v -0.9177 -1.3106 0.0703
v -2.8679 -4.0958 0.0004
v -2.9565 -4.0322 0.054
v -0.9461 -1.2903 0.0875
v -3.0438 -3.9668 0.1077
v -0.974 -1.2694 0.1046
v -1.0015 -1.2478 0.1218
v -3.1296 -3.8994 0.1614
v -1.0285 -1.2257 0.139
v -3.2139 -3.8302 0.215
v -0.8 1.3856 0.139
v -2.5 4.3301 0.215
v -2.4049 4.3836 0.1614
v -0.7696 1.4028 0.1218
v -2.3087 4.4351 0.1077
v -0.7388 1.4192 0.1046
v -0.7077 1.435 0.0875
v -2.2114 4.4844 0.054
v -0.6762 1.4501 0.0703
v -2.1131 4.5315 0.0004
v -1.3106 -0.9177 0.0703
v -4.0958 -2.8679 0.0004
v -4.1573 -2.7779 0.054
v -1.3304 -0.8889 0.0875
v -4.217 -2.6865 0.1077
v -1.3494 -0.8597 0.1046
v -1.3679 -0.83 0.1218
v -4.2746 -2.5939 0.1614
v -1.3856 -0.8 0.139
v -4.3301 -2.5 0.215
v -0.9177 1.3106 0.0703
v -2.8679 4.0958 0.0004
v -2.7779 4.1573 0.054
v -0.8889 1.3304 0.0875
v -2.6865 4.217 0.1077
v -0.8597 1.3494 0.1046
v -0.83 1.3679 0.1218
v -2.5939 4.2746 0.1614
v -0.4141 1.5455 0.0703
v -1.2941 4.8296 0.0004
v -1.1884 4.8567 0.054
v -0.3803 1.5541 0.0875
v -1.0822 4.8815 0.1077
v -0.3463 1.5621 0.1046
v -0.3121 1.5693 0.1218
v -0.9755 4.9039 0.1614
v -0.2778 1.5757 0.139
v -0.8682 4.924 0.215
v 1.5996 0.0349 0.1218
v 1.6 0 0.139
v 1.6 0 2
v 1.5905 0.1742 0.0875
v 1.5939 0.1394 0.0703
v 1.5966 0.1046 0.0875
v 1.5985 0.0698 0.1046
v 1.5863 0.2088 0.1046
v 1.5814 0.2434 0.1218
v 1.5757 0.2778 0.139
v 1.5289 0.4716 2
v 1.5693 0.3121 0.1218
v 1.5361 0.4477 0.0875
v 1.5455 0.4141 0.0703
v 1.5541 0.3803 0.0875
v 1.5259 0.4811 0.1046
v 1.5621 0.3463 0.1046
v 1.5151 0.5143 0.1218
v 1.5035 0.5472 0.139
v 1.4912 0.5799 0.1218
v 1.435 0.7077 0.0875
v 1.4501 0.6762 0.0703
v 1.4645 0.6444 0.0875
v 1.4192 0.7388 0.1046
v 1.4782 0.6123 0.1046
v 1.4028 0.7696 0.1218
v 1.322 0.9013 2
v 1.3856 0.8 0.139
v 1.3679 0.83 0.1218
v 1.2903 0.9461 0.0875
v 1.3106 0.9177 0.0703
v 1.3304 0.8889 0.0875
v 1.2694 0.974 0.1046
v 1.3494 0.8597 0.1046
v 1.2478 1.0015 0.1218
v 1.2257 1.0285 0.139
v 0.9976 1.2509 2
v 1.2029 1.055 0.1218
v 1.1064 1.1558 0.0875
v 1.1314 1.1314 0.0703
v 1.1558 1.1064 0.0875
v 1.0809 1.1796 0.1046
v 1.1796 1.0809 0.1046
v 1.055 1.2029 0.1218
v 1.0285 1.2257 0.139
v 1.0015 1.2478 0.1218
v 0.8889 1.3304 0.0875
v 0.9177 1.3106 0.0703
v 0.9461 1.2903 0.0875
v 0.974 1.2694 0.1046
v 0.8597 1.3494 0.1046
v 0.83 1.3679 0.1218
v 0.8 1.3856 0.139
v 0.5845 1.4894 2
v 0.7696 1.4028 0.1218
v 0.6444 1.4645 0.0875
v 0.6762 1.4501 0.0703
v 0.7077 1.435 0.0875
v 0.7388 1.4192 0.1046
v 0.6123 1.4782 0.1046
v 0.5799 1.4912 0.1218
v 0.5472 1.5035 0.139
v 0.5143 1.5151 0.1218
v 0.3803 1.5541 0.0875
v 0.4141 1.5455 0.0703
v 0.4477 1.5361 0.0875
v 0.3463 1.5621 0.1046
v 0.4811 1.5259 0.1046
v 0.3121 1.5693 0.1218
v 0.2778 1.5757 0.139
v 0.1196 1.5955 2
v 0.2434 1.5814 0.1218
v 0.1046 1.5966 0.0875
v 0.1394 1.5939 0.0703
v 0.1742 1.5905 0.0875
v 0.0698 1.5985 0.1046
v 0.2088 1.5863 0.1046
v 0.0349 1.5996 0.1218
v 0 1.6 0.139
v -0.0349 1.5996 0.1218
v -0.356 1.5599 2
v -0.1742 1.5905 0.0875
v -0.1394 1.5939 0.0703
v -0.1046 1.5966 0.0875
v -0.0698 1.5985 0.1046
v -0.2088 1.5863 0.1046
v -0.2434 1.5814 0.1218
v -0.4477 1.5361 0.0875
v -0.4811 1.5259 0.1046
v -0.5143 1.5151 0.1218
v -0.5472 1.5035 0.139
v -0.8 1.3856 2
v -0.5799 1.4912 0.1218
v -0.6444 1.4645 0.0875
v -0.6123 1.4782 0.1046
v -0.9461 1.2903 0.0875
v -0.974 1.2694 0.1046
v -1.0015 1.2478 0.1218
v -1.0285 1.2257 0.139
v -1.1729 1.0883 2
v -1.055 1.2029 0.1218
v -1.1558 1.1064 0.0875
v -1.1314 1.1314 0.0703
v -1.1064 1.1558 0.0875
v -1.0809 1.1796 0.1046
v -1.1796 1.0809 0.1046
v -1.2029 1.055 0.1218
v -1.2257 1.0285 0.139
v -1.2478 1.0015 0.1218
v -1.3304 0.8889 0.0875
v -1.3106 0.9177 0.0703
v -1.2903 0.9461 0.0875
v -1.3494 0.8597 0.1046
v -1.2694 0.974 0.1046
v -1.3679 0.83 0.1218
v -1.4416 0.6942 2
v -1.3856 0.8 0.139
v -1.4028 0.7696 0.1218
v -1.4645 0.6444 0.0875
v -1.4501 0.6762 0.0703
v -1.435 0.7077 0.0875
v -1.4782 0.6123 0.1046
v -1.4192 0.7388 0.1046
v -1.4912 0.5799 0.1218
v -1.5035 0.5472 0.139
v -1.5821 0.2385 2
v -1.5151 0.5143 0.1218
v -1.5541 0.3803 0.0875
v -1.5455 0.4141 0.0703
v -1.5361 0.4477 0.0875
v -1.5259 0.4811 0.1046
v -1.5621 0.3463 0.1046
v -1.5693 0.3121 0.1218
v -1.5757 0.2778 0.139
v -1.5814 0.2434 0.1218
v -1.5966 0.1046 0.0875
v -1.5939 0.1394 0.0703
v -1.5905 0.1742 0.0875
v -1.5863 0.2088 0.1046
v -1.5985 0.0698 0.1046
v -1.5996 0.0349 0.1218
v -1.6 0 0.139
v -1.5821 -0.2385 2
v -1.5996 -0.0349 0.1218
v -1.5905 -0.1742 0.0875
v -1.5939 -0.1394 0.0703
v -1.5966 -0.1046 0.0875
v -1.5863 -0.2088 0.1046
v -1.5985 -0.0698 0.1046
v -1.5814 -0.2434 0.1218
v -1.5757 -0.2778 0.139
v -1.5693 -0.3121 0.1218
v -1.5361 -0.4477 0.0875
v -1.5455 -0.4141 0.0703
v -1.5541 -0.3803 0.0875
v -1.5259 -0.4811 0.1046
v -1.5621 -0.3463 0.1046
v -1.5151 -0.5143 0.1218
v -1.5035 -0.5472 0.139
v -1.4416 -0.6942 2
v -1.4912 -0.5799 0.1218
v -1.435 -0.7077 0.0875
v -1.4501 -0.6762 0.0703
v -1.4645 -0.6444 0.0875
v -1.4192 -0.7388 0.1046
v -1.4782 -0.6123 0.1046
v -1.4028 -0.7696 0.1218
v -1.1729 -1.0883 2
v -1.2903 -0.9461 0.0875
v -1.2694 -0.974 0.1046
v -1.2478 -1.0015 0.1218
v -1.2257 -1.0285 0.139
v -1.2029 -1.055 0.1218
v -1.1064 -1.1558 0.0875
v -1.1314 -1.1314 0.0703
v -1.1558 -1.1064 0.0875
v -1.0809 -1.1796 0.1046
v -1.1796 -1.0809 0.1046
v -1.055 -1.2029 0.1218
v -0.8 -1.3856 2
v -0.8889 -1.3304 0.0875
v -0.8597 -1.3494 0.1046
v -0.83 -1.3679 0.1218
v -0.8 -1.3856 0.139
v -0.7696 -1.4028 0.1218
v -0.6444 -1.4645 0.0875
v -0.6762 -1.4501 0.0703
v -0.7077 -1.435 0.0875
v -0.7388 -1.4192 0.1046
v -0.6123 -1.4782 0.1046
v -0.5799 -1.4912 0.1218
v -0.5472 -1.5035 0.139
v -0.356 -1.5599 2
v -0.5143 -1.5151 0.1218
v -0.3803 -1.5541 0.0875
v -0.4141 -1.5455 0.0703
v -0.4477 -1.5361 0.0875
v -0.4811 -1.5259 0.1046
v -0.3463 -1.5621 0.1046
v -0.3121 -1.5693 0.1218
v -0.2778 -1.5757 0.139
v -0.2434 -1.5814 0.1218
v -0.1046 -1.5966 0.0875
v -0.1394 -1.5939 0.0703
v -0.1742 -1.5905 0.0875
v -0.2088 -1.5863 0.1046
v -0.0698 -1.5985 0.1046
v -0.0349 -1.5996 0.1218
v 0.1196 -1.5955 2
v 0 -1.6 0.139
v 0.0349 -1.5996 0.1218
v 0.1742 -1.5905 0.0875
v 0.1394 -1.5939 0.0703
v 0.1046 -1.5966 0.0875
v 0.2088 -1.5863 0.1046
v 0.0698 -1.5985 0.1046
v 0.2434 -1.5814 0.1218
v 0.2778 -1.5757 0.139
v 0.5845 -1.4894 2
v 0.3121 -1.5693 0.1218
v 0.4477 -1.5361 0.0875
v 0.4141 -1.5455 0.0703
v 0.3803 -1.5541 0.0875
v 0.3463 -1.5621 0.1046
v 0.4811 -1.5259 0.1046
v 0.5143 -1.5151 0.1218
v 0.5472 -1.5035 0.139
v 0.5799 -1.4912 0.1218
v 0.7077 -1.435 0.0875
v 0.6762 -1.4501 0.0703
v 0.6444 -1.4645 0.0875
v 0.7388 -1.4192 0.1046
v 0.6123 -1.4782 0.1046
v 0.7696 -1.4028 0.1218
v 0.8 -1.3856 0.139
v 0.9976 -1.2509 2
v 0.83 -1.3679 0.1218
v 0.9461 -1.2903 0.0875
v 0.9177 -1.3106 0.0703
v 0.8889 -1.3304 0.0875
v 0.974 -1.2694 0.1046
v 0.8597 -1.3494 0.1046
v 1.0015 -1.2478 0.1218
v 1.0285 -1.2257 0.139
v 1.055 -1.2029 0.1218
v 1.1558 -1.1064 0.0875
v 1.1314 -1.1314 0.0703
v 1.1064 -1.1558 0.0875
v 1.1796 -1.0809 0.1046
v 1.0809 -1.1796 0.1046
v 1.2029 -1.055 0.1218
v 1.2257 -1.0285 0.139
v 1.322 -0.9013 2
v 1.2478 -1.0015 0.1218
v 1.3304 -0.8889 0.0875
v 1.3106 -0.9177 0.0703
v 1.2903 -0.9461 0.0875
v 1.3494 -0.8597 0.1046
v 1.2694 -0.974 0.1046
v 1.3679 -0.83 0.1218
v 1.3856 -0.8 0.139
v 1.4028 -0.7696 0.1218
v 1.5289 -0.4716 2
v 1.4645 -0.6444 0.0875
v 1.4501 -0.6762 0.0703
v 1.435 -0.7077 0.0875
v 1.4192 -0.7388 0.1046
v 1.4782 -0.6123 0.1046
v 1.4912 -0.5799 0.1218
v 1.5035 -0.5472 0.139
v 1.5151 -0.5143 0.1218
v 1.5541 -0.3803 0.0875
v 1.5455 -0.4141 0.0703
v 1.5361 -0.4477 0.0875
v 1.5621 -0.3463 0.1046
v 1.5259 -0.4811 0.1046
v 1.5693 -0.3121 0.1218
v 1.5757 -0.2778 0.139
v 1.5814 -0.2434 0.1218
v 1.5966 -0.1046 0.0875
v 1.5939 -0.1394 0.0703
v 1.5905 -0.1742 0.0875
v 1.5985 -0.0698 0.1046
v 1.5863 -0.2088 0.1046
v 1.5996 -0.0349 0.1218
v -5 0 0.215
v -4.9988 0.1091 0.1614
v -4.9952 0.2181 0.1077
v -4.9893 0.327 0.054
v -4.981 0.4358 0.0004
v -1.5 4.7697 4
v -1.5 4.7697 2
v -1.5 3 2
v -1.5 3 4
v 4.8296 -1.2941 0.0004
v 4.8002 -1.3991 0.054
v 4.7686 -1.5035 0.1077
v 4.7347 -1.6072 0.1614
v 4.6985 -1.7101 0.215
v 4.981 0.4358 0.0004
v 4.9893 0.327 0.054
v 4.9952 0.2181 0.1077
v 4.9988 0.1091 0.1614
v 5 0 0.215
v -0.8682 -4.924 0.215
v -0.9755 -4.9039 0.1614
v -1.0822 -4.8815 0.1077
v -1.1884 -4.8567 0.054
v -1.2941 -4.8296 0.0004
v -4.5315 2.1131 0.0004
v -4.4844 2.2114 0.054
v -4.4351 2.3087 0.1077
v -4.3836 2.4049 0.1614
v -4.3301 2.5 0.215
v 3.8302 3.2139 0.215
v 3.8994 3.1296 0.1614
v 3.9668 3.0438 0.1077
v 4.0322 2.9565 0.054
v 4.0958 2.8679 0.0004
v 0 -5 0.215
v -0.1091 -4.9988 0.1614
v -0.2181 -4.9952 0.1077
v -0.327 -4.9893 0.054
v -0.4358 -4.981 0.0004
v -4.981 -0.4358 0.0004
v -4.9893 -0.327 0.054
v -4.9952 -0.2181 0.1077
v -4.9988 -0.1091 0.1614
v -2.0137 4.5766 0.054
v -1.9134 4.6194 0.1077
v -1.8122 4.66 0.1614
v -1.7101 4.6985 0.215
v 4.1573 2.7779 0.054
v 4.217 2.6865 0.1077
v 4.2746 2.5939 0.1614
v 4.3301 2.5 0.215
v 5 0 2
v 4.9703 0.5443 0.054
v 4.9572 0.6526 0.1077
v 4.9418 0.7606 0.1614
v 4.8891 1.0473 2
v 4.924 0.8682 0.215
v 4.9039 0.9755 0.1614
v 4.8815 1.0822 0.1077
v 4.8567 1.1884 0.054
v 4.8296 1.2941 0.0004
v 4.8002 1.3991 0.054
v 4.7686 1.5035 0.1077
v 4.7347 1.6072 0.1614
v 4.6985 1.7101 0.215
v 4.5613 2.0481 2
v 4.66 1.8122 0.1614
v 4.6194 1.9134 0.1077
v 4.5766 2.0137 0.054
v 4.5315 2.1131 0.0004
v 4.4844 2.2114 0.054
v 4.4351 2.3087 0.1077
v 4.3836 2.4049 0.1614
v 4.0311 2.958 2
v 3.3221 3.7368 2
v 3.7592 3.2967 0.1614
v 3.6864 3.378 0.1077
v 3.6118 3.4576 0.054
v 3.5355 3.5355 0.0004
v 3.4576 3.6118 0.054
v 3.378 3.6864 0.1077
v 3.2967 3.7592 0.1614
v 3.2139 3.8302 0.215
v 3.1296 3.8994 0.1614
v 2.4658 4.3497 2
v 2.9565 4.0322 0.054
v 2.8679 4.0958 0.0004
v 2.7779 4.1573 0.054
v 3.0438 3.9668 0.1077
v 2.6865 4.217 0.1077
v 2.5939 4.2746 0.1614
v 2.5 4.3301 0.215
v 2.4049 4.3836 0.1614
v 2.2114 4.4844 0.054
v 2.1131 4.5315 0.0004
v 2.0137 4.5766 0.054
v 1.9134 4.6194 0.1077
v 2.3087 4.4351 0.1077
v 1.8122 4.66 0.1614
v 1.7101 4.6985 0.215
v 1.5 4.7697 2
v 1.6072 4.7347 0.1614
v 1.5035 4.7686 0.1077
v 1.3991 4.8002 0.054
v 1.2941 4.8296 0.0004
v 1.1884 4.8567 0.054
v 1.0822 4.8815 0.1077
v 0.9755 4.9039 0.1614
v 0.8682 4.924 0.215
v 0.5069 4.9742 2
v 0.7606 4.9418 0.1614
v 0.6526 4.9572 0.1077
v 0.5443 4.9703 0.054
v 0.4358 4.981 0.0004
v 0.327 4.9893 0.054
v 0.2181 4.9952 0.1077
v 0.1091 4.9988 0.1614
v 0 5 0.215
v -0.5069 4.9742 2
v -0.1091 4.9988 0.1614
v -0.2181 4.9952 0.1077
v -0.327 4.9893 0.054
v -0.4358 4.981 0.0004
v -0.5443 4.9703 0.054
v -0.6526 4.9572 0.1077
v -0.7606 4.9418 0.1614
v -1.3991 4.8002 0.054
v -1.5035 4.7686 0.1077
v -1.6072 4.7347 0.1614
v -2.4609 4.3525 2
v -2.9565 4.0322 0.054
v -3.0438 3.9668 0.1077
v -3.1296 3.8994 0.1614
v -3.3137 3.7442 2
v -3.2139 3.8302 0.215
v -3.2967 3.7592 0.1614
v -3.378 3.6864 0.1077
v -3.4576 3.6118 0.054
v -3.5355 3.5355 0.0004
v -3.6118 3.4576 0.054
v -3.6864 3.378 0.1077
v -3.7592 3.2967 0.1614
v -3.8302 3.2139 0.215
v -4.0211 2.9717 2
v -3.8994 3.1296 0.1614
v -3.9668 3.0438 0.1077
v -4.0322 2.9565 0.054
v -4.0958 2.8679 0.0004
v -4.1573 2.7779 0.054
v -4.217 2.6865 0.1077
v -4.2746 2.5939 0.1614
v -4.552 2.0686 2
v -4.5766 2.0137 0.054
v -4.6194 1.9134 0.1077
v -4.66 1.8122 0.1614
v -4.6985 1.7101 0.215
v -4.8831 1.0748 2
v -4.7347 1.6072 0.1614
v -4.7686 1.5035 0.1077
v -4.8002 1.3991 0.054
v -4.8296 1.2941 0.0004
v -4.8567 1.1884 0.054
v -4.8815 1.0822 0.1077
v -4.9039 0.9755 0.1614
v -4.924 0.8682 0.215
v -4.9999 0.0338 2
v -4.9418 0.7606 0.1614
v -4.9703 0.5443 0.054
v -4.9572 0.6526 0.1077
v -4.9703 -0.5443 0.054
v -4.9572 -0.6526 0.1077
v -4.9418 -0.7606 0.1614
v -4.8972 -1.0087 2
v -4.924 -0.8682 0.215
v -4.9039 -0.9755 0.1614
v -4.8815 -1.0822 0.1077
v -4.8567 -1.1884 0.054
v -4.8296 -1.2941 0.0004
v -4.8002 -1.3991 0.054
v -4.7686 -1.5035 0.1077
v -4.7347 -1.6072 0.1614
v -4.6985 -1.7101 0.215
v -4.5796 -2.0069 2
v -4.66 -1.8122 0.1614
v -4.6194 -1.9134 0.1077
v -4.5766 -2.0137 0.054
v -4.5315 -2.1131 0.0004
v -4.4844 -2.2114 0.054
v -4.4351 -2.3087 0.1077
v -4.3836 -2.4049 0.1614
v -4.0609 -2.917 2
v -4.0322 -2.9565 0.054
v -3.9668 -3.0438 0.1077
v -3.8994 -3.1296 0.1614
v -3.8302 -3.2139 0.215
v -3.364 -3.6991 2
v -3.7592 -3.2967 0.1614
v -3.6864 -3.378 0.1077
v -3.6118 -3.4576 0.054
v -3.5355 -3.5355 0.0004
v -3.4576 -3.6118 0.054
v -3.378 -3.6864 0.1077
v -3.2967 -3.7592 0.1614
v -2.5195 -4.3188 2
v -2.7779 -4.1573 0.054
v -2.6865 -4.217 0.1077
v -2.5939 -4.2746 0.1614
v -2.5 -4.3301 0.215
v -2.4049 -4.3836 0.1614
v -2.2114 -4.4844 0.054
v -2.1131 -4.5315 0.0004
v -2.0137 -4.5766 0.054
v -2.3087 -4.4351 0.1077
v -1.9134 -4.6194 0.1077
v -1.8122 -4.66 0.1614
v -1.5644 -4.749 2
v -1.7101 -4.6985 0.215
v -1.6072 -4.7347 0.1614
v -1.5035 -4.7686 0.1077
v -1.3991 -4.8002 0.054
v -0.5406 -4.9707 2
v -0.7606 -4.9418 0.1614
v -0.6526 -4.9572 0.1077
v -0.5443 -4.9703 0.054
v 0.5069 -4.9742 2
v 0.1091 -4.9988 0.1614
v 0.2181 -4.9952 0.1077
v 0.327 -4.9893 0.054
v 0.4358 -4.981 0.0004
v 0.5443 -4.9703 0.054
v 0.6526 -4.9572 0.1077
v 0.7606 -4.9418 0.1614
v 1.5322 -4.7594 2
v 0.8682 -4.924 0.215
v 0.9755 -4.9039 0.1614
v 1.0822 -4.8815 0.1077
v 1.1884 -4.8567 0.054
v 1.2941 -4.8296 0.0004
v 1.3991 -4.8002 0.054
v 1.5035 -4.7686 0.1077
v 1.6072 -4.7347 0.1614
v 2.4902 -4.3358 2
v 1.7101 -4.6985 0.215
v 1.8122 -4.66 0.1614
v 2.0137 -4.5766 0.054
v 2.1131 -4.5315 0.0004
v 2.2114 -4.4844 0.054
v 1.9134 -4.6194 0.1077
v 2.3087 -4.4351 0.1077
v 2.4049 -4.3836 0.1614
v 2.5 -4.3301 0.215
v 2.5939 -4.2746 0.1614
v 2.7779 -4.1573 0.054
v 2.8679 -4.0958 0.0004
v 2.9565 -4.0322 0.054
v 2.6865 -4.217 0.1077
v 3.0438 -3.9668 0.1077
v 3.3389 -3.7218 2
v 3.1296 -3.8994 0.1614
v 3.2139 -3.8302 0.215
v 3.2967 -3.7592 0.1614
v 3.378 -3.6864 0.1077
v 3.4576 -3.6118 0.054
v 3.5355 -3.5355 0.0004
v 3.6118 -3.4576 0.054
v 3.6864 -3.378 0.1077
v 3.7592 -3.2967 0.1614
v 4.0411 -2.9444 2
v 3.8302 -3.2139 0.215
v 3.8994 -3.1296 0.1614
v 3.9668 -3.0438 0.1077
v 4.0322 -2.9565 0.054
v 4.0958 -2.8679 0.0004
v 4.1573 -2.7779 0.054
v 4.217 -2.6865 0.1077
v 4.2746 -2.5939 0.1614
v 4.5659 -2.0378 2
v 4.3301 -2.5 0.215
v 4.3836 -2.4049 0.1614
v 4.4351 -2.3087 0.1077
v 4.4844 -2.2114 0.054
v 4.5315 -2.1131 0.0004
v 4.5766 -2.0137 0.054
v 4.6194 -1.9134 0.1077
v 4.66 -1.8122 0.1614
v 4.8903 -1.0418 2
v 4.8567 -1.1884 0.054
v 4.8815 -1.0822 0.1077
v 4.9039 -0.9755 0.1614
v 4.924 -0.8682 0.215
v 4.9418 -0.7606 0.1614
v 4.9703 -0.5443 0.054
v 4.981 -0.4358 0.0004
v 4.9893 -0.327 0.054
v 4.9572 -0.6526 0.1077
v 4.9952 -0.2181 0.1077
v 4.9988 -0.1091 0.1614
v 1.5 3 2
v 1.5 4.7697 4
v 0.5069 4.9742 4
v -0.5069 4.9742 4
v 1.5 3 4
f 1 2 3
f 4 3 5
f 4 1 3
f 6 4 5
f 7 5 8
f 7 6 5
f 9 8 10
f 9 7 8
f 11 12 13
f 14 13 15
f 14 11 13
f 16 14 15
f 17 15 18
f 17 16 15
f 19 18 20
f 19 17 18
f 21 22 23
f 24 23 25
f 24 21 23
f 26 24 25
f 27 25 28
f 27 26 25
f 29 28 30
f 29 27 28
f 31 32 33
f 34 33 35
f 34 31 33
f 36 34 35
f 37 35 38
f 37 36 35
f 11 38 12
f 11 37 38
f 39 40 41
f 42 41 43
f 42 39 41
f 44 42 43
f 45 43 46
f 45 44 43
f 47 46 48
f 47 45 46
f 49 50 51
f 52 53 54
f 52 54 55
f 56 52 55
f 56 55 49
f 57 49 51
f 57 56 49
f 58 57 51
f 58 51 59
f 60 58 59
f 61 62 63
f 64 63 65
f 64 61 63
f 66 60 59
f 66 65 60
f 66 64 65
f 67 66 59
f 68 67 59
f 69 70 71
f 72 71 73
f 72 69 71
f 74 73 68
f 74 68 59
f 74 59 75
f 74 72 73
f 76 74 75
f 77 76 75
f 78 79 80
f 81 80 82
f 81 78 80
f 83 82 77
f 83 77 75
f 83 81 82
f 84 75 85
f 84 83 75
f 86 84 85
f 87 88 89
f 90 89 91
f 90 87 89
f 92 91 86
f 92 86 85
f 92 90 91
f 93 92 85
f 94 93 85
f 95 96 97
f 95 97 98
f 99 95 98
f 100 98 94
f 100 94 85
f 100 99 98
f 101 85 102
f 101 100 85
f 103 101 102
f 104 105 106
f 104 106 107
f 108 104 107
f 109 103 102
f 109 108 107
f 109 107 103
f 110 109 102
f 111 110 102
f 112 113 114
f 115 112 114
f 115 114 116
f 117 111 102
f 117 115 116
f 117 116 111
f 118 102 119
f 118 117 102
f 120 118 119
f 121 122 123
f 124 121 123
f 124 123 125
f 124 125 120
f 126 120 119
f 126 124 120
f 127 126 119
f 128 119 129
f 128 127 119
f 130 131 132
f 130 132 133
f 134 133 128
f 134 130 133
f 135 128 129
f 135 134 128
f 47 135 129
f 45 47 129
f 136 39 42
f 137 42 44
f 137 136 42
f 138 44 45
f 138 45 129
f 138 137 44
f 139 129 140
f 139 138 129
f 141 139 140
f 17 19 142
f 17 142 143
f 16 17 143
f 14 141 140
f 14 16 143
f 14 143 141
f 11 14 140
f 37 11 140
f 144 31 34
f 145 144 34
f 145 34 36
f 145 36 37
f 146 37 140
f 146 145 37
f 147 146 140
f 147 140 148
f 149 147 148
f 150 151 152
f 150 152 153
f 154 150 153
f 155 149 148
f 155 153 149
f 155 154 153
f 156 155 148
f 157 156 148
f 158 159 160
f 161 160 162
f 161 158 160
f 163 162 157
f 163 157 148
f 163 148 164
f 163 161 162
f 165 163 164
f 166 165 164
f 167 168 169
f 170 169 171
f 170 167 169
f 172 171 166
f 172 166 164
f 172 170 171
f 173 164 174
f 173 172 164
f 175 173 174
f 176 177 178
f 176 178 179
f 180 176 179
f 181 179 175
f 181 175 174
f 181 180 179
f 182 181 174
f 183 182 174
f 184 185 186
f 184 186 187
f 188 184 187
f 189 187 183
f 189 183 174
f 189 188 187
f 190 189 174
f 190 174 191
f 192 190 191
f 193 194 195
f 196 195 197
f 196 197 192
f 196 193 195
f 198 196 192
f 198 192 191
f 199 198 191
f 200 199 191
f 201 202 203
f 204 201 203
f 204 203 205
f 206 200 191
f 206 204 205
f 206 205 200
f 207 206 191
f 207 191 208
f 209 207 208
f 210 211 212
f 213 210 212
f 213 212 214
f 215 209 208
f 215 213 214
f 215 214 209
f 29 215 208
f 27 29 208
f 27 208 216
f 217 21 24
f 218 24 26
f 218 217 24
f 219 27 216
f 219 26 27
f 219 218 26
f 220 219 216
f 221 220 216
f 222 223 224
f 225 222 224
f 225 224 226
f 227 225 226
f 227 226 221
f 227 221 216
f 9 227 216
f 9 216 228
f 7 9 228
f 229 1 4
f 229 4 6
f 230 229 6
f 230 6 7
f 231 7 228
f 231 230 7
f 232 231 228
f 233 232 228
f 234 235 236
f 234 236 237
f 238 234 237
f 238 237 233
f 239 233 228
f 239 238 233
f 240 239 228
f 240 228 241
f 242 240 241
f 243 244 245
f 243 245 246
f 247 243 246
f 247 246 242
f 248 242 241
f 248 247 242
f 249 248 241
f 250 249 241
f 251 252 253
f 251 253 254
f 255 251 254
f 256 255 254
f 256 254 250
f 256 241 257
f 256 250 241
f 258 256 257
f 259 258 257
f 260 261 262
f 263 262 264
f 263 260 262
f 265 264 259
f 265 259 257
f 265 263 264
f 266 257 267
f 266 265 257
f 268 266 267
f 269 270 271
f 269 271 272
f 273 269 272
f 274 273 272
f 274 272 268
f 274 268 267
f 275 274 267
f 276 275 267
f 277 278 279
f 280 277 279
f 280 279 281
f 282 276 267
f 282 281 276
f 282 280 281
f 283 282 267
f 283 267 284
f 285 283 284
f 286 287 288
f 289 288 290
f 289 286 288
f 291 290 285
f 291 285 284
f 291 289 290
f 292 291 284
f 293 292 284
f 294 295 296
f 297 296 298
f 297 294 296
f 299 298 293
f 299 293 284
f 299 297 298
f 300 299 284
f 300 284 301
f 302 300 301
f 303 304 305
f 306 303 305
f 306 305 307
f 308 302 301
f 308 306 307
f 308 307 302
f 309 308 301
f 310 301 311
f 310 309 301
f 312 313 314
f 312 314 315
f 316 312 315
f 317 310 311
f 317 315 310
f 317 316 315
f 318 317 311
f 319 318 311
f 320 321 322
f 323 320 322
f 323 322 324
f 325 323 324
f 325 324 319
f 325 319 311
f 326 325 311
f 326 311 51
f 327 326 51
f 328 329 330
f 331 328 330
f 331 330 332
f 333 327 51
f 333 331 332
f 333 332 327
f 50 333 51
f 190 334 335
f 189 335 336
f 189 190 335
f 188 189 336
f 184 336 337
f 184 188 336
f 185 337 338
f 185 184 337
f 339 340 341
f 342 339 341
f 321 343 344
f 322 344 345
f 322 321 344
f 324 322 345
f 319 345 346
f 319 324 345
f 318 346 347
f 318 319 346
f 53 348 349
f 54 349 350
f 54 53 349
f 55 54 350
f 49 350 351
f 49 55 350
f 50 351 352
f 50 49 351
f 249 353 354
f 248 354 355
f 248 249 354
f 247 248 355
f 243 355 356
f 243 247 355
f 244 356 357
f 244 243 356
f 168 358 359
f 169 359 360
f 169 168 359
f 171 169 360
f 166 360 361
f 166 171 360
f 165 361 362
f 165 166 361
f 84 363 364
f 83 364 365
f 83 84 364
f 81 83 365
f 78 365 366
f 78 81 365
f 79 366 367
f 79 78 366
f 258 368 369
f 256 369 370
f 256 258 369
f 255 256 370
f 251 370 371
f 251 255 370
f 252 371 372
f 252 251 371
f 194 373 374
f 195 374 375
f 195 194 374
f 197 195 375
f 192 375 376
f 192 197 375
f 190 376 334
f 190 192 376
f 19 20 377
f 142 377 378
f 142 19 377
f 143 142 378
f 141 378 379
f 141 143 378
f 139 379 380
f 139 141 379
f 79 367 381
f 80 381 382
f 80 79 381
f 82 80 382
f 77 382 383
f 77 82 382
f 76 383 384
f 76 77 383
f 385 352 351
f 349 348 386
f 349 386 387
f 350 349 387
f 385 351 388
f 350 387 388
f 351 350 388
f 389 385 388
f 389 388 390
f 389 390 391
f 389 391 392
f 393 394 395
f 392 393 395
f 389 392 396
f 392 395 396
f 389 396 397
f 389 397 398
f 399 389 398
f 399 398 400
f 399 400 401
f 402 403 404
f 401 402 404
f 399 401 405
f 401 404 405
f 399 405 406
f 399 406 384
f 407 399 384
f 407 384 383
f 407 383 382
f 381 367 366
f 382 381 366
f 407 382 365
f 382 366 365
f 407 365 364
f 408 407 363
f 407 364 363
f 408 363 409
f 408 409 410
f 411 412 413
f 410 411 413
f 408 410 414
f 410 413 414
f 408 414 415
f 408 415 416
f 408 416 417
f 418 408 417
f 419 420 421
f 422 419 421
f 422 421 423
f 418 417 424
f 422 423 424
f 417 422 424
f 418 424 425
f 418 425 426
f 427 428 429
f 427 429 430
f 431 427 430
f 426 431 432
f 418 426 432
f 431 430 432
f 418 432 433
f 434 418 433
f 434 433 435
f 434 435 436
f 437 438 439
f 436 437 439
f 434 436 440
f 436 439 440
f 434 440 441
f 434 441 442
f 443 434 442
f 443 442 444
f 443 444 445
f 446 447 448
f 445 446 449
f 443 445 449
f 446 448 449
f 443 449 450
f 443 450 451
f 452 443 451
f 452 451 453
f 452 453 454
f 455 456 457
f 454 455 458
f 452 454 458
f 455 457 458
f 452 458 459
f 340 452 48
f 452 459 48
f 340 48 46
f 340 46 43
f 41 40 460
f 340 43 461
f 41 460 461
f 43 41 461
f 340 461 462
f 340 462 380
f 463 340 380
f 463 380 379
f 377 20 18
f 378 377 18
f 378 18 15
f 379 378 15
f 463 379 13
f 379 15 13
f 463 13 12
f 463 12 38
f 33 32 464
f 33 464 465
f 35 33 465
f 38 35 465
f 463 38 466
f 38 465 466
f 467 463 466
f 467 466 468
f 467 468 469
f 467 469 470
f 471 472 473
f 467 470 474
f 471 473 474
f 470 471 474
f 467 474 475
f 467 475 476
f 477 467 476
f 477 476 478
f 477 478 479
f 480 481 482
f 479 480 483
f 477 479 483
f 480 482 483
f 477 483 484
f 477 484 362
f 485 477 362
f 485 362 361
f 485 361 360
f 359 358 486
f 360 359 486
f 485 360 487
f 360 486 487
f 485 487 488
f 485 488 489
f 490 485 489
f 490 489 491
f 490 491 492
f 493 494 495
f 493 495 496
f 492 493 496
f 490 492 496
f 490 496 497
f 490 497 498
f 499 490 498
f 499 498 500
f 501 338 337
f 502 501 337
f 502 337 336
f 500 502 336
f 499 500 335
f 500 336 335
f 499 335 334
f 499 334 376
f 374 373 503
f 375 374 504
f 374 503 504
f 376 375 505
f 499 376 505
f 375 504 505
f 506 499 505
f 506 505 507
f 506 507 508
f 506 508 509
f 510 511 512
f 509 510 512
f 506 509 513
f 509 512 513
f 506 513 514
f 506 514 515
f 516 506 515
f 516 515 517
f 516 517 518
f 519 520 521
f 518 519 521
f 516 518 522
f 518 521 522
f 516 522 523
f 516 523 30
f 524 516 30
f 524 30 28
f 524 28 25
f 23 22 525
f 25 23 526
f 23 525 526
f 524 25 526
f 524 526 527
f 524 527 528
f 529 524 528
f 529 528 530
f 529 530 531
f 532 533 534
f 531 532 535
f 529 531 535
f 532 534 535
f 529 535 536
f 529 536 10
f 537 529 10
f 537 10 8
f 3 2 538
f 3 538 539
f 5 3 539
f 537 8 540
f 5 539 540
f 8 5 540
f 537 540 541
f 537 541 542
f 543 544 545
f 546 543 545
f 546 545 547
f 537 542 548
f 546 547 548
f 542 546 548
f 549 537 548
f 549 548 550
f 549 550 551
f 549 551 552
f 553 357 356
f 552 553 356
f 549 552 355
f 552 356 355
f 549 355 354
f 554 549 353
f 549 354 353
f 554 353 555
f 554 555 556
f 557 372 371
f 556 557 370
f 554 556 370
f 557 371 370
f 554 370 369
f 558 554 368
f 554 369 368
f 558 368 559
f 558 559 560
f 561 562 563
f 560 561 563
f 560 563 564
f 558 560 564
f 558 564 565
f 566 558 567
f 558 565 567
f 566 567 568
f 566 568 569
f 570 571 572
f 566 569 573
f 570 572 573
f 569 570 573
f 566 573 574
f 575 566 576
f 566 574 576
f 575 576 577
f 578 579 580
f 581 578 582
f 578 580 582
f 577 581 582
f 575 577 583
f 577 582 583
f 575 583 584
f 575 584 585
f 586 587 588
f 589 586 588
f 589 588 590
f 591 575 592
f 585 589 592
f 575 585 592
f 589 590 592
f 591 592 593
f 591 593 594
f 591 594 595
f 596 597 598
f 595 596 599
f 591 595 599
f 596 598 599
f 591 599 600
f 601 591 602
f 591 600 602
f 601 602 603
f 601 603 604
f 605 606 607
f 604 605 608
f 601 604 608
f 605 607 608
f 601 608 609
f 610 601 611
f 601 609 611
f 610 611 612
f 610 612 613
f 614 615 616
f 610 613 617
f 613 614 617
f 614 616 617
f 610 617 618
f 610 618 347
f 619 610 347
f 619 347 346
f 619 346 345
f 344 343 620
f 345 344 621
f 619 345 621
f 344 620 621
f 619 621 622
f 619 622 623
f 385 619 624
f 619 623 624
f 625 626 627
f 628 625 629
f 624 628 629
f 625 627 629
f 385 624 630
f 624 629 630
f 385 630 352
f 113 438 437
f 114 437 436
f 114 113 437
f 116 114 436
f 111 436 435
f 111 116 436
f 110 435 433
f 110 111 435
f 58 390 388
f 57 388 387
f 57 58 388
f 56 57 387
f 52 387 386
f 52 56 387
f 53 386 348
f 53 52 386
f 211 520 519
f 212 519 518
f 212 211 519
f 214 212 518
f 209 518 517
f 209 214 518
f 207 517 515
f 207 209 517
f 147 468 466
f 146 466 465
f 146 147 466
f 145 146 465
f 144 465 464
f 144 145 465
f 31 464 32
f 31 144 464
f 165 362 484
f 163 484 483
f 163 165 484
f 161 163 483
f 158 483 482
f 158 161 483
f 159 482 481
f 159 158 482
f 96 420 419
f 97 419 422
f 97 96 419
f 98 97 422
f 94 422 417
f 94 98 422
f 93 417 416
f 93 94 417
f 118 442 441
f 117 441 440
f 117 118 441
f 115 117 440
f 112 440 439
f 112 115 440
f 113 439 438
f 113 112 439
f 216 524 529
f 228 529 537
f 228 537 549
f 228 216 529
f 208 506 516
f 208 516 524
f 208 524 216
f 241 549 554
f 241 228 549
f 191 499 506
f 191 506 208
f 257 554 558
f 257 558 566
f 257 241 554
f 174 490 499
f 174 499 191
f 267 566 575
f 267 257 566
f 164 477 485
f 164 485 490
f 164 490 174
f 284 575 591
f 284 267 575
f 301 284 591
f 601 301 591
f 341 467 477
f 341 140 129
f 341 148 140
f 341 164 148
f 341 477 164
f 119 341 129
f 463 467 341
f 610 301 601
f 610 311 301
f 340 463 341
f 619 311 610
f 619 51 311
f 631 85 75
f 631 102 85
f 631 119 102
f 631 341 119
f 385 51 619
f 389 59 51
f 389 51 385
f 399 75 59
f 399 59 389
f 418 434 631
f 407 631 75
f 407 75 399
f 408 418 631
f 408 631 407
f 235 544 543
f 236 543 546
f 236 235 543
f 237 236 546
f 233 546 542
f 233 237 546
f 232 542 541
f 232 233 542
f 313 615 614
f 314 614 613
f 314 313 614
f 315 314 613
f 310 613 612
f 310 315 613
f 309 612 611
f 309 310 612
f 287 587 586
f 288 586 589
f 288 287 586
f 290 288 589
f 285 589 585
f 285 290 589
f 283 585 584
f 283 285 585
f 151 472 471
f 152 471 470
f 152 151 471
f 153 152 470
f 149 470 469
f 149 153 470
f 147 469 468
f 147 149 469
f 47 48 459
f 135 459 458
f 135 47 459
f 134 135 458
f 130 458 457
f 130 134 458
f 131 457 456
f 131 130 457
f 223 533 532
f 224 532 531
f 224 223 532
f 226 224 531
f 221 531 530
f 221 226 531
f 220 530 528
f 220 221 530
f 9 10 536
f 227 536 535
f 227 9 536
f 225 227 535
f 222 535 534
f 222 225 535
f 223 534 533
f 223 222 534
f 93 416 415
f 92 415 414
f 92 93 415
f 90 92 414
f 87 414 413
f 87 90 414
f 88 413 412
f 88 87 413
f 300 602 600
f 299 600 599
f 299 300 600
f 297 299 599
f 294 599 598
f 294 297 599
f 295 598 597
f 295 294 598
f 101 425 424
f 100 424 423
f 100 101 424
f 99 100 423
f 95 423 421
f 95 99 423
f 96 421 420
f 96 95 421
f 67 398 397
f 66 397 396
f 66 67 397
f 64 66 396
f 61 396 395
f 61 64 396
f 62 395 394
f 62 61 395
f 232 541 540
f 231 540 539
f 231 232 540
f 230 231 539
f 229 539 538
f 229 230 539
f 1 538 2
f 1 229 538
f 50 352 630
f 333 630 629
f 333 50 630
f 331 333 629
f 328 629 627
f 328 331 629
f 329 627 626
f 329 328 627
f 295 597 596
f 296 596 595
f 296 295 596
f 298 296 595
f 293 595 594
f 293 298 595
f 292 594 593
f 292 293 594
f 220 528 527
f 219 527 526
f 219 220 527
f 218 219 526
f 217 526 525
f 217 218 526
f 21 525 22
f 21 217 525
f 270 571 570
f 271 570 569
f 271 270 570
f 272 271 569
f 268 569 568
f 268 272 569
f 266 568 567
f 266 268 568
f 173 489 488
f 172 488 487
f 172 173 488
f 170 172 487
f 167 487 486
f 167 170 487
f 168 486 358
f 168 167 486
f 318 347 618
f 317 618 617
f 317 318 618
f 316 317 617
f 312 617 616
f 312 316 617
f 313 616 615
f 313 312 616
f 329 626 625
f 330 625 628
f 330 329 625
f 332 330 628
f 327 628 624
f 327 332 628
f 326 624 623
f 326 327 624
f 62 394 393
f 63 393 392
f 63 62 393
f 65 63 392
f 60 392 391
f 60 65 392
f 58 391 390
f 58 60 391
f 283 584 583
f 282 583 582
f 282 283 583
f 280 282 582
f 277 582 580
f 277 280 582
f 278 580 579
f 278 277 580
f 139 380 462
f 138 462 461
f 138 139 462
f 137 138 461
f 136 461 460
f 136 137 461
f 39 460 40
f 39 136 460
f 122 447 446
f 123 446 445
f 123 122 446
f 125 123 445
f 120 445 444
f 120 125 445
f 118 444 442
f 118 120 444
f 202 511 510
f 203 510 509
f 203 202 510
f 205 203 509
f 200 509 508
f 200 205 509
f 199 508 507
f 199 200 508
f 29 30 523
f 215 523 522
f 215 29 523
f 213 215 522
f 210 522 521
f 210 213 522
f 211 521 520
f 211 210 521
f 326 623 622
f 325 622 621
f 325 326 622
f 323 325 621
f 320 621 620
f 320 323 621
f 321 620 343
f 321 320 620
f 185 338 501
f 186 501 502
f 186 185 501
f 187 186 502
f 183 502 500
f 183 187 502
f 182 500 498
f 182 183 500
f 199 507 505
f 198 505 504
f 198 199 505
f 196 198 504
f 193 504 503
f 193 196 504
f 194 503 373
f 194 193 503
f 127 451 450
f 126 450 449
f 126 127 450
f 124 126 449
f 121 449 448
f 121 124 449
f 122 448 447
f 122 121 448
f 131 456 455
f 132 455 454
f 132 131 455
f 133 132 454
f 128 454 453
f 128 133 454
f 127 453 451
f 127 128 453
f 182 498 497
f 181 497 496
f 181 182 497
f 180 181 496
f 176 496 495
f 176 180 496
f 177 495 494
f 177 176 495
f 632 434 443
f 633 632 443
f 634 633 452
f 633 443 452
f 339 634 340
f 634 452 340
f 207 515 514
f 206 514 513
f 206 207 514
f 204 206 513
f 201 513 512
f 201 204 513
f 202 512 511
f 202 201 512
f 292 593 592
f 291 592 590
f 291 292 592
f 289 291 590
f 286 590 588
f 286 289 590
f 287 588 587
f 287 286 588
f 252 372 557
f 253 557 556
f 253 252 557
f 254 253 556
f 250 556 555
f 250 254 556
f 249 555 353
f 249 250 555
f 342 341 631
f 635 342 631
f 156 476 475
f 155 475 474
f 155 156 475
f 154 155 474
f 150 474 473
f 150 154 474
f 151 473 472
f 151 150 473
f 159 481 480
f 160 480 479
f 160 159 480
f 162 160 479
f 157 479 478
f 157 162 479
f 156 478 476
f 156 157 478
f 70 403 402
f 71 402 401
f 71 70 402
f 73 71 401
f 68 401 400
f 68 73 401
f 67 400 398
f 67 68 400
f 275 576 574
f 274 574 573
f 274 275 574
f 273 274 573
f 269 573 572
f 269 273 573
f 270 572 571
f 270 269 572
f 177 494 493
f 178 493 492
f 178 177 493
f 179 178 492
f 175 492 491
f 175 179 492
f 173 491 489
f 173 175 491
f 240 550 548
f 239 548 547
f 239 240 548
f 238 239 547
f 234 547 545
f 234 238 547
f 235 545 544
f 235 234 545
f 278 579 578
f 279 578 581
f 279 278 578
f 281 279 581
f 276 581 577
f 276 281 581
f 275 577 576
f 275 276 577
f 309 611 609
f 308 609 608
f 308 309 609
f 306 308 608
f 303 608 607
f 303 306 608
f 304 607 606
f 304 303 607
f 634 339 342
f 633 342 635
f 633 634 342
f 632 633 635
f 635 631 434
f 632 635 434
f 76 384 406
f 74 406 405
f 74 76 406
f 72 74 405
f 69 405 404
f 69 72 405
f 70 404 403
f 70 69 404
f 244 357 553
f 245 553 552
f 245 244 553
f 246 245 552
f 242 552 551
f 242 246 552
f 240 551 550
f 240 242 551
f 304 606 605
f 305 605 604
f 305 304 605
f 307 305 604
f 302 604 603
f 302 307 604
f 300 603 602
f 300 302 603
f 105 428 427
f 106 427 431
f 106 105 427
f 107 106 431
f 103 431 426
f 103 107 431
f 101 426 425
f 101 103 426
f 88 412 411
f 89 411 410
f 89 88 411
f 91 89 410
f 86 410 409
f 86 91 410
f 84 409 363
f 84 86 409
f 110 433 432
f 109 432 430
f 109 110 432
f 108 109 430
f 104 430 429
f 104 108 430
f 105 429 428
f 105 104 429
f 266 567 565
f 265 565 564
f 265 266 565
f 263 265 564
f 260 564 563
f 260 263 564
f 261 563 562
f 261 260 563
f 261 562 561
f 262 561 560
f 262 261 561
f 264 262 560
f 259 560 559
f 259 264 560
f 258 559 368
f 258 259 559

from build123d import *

# Parameters (mm, degrees)
SKETCH_1_R               = 5
SKETCH_1_R_2             = 1.6
EXTRUDE_1_DEPTH          = 2
EXTRUDE_2_DEPTH          = 2
CUT_EXTRUDE_START        = 1.574632158
CUT_EXTRUDE_1_DEPTH      = 3.428926011
PATTERN_CIRCULAR_1_COUNT = 36


# Read off the part's stored shape, not the designer's step: 切除-拉伸1
with BuildPart() as part:
    # 草图1 → 凸台-拉伸1 (new body)
    with BuildSketch(Plane.XY):
        Circle(SKETCH_1_R)
        Circle(SKETCH_1_R_2, mode=Mode.SUBTRACT)
    extrude(amount=EXTRUDE_1_DEPTH)

    # 草图2 → 凸台-拉伸2 (add)
    with BuildSketch(Plane.XY.offset(2)):
        with BuildLine():
            Line((-1.5, 4.769696007), (-1.5, 3))
            Line((-1.5, 3), (1.5, 3))
            Line((1.5, 3), (1.5, 4.769696007))
            ThreePointArc((1.5, 4.769696007), (0, 5), (-1.5, 4.769696007))
        make_face()
    extrude(amount=EXTRUDE_2_DEPTH)

    # 切除-拉伸1 outline → 切除-拉伸1 (cut)
    with BuildSketch(Plane(origin=(0, 0, 0), x_dir=(0, 1, 0), z_dir=(0.9997499284218206, 0, 0.022362482432963404)).offset(CUT_EXTRUDE_START)):
        Polygon((0.436574347, -0.111385374), (0, 0.103160358), (-0.436574347, -0.111385374), (-2, -0.879699645), (-2, -2), (2, -2), (2, -0.879699645), align=None)
    cut_extrude_1 = extrude(amount=CUT_EXTRUDE_1_DEPTH, mode=Mode.SUBTRACT)

    # 阵列(圆周)1: 切除-拉伸1 ×36 about axis
    pattern_circular_1_axis = Axis((0, 0, 0), (0, 0, 1))
    for i in range(1, PATTERN_CIRCULAR_1_COUNT):
        add(cut_extrude_1.rotate(pattern_circular_1_axis, i * 360 / PATTERN_CIRCULAR_1_COUNT), mode=Mode.SUBTRACT)


solid = part.part
